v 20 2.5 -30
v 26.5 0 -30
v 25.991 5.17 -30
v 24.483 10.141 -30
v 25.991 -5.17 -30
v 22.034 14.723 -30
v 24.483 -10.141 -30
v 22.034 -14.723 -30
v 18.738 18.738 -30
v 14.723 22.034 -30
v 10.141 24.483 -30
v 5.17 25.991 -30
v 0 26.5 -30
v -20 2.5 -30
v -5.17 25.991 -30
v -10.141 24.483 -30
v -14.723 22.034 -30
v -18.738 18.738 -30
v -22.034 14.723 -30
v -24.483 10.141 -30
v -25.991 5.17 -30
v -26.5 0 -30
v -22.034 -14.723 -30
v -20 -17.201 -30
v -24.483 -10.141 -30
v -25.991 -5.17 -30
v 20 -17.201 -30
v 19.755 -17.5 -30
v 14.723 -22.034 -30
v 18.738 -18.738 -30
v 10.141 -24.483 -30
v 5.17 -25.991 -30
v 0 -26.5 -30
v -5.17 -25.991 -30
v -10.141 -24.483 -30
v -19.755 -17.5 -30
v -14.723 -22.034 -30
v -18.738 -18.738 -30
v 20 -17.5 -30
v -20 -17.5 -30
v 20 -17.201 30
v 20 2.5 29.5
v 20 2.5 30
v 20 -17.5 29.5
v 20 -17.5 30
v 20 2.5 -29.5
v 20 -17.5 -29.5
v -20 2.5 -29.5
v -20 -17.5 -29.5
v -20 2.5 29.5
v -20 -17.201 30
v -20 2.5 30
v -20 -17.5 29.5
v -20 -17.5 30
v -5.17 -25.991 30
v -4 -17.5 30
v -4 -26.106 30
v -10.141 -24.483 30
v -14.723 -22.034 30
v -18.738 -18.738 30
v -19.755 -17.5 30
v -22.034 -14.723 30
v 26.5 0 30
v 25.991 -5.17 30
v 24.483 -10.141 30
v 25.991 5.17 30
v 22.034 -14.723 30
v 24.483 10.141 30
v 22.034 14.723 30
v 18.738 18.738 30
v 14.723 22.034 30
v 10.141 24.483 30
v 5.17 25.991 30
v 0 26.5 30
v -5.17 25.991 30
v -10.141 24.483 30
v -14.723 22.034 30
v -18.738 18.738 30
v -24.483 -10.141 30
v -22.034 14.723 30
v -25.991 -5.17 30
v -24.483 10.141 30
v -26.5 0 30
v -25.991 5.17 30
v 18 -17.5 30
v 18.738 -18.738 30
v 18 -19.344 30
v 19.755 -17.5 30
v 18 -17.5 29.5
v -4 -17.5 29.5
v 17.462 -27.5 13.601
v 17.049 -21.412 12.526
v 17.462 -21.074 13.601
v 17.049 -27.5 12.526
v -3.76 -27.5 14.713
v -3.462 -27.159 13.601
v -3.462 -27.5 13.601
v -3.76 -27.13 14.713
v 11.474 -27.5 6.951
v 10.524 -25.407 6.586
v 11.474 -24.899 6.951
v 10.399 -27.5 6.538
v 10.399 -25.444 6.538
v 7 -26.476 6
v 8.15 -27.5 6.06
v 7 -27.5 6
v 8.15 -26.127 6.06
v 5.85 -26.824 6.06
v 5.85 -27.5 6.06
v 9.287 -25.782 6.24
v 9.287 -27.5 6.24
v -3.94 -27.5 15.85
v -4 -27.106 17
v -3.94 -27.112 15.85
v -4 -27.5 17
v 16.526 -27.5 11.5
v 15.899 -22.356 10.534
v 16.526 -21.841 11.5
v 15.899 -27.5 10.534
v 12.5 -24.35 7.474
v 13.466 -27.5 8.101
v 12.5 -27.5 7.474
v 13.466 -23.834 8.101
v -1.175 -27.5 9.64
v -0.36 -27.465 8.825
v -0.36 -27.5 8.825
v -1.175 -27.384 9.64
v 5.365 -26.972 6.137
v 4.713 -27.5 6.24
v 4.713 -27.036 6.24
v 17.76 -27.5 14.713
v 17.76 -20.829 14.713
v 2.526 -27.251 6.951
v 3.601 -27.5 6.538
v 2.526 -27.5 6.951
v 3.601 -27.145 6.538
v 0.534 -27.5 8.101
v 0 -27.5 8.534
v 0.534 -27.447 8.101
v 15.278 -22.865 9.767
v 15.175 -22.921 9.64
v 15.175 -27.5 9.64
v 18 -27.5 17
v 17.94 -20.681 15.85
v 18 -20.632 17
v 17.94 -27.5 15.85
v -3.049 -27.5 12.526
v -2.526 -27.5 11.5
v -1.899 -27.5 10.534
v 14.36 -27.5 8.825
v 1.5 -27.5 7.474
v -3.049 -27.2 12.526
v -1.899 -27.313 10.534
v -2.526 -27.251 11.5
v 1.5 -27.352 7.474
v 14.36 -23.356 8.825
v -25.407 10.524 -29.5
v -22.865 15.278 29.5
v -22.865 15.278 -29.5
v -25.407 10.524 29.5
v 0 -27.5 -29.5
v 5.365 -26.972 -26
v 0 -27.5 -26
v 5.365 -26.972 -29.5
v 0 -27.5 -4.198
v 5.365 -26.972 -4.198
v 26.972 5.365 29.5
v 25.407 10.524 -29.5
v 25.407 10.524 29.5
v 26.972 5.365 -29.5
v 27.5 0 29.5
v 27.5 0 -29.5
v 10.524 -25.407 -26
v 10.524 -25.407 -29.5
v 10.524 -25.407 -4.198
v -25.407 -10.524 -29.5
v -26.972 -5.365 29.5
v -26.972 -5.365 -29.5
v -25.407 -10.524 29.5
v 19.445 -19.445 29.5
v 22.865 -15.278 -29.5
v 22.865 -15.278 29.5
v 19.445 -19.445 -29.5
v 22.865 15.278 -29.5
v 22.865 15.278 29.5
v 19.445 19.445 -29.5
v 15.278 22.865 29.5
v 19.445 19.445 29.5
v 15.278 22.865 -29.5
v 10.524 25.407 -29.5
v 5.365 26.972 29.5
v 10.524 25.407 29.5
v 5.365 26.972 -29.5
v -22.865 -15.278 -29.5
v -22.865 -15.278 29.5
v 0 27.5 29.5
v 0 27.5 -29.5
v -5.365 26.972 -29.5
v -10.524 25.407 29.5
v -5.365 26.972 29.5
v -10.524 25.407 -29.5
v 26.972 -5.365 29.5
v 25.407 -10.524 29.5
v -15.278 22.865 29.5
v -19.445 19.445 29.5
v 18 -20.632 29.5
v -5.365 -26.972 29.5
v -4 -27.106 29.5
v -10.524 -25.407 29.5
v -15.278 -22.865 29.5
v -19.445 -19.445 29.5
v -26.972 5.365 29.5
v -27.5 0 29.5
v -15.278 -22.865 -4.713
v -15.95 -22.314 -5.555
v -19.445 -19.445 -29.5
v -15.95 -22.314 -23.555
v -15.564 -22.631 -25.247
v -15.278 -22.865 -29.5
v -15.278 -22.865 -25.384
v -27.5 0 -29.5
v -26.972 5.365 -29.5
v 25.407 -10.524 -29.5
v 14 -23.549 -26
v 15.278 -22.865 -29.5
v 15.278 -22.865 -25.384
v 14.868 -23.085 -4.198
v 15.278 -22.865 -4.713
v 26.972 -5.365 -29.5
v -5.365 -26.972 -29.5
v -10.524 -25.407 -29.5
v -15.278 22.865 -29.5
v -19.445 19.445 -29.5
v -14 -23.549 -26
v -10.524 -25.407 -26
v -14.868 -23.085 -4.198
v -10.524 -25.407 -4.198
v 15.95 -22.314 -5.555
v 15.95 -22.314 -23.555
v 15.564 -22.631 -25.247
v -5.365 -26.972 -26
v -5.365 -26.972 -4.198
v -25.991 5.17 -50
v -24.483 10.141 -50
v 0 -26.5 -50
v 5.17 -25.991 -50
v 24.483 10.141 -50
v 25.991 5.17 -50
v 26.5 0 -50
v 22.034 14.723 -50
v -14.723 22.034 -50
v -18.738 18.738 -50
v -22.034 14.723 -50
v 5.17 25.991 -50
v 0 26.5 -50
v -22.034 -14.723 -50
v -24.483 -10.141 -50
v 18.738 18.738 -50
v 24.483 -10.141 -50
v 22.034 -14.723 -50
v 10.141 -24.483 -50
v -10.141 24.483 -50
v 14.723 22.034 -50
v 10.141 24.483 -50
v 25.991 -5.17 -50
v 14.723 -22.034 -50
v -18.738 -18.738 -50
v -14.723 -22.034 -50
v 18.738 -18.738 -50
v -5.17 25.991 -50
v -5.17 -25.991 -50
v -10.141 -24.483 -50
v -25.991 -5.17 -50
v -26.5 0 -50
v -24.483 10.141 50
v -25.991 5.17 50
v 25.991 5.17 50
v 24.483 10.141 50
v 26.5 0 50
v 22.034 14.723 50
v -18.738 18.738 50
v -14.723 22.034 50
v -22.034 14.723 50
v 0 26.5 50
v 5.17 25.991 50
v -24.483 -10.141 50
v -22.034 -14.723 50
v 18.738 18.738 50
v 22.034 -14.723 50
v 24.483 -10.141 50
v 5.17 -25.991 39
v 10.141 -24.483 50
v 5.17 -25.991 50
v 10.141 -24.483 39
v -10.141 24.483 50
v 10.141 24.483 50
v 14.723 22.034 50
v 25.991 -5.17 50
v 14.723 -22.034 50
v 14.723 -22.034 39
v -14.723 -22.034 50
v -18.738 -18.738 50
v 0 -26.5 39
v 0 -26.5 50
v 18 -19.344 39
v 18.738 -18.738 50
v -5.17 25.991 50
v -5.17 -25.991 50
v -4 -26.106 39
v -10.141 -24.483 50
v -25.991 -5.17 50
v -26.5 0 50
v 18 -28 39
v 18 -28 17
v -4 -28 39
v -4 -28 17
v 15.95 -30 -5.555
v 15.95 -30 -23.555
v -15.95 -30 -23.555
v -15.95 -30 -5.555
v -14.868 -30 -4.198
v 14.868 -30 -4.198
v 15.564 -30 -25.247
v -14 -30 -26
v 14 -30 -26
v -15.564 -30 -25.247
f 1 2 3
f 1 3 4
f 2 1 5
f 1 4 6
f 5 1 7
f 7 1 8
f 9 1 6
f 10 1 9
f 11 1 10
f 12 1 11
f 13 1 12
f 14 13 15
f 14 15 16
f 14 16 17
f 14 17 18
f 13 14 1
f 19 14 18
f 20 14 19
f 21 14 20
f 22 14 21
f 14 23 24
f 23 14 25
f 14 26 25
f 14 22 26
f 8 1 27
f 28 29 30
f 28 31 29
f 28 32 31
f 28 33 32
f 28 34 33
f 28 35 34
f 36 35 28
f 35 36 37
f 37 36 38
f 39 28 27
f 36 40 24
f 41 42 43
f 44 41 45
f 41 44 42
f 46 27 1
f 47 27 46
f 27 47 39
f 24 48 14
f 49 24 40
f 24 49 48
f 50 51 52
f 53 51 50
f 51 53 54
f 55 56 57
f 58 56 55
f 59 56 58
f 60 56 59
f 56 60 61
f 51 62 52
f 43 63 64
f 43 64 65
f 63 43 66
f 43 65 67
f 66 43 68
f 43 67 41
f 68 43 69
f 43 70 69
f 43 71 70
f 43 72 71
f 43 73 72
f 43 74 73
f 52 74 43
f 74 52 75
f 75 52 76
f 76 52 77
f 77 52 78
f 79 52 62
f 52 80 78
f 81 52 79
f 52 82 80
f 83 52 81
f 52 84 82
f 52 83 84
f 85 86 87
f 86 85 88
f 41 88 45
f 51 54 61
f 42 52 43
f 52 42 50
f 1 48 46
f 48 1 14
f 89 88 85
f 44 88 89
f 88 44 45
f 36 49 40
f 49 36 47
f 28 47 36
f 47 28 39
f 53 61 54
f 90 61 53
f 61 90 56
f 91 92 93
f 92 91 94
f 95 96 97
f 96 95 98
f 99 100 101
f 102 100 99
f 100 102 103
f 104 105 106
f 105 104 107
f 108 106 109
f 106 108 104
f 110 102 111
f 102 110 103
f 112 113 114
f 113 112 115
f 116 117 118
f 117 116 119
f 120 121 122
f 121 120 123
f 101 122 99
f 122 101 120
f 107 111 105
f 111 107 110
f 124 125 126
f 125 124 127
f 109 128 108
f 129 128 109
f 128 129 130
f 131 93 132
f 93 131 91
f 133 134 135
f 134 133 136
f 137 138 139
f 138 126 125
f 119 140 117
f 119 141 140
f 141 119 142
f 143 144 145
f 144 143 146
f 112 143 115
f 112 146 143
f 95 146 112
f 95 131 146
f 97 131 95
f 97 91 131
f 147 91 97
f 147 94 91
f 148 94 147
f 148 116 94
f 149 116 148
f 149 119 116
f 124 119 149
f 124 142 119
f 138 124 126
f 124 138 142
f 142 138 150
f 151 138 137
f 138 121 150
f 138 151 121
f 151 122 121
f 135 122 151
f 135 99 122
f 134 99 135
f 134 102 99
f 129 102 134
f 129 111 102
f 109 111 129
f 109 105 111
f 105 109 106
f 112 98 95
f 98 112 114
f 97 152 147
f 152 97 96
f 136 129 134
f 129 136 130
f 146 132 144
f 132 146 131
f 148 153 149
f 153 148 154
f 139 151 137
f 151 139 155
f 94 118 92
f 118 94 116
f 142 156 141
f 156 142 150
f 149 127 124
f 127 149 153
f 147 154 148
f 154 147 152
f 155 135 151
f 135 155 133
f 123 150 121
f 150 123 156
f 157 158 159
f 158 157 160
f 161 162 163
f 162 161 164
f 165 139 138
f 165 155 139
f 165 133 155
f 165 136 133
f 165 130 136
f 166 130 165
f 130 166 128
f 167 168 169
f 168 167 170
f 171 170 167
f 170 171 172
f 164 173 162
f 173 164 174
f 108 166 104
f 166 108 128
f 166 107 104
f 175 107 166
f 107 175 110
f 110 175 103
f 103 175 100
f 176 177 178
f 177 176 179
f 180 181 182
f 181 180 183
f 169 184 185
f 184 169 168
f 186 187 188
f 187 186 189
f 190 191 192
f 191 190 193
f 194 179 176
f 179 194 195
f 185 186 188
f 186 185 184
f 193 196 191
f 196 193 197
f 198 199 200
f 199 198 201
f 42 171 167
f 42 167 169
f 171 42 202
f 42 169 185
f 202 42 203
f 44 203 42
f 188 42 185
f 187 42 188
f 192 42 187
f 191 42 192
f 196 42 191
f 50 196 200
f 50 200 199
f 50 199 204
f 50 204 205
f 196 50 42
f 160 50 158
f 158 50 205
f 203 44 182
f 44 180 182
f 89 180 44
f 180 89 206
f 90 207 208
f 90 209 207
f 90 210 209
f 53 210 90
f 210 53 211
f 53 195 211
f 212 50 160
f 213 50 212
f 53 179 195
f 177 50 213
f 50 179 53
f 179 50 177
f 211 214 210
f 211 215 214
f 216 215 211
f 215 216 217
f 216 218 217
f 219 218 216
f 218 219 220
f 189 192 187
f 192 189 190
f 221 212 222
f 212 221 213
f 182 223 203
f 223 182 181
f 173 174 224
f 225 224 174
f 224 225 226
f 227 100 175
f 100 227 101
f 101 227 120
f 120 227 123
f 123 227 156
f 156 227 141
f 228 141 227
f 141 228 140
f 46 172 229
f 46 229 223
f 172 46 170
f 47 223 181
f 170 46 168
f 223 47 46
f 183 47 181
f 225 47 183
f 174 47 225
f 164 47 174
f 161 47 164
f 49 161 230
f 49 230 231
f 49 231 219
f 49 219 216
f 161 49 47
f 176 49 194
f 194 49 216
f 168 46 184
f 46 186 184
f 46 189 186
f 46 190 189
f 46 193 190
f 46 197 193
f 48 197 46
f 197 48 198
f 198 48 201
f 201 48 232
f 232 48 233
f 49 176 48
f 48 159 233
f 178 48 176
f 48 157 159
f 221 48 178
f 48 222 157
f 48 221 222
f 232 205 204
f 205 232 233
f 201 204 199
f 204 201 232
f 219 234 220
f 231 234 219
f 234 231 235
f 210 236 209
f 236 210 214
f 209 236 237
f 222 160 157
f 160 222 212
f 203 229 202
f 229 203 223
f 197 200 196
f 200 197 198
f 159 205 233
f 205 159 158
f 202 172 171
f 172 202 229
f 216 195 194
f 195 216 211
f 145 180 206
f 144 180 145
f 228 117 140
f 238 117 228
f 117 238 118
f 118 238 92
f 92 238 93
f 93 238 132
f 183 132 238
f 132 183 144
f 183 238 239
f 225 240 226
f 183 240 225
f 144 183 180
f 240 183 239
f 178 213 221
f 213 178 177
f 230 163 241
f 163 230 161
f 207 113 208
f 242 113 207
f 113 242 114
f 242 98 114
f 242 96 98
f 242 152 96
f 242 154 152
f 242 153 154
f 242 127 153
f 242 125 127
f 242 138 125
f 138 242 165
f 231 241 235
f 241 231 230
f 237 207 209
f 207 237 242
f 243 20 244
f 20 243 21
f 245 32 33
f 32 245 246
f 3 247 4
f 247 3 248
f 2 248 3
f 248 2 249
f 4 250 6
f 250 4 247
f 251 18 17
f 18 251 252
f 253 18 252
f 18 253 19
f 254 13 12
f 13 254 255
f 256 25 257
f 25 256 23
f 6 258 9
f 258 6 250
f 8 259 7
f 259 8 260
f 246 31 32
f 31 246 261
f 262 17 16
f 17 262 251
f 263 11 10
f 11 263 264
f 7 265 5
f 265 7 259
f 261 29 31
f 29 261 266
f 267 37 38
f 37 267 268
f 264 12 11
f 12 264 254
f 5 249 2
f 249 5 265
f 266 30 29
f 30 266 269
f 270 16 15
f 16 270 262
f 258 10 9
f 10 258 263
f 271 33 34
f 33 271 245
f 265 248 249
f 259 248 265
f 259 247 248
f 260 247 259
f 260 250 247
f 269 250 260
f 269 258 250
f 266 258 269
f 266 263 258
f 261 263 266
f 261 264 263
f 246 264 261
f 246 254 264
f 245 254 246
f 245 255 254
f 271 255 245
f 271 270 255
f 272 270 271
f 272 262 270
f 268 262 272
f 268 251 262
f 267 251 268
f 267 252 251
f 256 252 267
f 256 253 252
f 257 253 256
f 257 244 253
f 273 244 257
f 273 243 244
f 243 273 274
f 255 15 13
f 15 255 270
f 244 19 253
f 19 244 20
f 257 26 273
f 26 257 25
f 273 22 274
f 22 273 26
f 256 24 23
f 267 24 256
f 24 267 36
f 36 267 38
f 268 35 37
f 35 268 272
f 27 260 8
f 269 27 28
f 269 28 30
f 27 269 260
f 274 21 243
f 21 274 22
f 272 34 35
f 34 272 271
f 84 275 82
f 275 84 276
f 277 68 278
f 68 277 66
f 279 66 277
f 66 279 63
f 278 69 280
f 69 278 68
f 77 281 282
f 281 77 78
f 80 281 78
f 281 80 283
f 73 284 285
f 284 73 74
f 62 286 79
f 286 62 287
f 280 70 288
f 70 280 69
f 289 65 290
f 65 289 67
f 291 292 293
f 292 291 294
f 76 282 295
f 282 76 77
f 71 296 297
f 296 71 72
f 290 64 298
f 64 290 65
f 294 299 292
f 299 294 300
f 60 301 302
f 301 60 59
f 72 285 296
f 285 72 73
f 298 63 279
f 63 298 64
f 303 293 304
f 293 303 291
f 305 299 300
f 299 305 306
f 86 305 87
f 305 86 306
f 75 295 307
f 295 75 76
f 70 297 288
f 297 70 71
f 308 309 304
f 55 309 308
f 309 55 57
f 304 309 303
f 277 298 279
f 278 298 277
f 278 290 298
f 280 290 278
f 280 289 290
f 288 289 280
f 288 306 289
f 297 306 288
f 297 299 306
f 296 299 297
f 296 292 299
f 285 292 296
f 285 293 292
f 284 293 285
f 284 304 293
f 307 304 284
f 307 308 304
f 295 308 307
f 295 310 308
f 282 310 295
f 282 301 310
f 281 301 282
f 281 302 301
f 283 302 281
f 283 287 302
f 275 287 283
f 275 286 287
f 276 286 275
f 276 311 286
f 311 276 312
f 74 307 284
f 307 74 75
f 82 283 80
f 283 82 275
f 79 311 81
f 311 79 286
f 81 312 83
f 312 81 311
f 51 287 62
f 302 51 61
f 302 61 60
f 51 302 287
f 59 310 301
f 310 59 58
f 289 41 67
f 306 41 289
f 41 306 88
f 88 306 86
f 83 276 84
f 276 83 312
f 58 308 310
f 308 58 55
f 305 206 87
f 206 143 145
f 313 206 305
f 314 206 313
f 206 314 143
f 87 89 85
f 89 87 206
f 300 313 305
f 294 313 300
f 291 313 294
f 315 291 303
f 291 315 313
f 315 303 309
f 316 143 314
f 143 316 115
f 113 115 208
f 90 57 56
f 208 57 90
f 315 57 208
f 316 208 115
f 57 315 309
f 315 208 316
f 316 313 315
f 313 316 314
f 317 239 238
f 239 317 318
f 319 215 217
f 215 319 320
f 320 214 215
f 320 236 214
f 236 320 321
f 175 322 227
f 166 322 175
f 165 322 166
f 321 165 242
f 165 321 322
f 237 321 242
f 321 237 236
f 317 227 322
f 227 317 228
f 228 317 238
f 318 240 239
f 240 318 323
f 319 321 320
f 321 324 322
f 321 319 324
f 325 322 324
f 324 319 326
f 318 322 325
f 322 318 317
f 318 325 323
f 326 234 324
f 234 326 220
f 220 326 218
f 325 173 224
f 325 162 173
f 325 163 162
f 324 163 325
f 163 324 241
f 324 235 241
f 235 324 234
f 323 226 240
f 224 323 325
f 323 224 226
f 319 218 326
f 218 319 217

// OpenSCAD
q = 7.5;

module roundedRect(size, radius) {
    x = size[0];
    y = size[1];
    z = size[2];

    linear_extrude(height=z)
    hull() {
        translate([(-x/2)+(radius/2), (-y/2)+(radius/2), 0])
            circle(r=radius);
        translate([(x/2)-(radius/2), (-y/2)+(radius/2), 0])
            circle(r=radius);
        translate([(-x/2)+(radius/2), (y/2)-(radius/2), 0])
            circle(r=radius);
        translate([(x/2)-(radius/2), (y/2)-(radius/2), 0])
            circle(r=radius);
    }
}



module GoPro() {
    color("red",0.75)
    union() {
        rotate([0, 90, 0])
        cube([60, 20, 40],center=true);
        translate([40/2-13, -20, 60/2-13])
            rotate([90,90,0])
                translate([0, 0, -10])
                    cylinder(h=20, d=22, center=true, $fn=60);
    };    
};

module RocketZero() {
        
        union() {
            color("yellow",0.75)
            cylinder(h=60-1,d=55, center=true, $fn=32);
            color("orange",0.75)
            translate([0, -0, -40])
            cylinder(h=20,d=53, center=true, $fn=32);
             translate([0, -0, 40])
            cylinder(h=20,d=53, center=true, $fn=32);
            
            color("gray",0.75)
                translate([0, -q, 0])
                      GoPro();
            color("blue",0.25)
            translate([40/2-13, -18, 60/2-13+22/2])
                cube([22,20,22], center=true);
            color("green",0.25)
            translate([0, -15, -15])
                rotate([90,90,0])
                        roundedRect([20, 30, 15], 2);
        };
};

RocketZero();
//translate([0, -q, 0]) GoPro();
